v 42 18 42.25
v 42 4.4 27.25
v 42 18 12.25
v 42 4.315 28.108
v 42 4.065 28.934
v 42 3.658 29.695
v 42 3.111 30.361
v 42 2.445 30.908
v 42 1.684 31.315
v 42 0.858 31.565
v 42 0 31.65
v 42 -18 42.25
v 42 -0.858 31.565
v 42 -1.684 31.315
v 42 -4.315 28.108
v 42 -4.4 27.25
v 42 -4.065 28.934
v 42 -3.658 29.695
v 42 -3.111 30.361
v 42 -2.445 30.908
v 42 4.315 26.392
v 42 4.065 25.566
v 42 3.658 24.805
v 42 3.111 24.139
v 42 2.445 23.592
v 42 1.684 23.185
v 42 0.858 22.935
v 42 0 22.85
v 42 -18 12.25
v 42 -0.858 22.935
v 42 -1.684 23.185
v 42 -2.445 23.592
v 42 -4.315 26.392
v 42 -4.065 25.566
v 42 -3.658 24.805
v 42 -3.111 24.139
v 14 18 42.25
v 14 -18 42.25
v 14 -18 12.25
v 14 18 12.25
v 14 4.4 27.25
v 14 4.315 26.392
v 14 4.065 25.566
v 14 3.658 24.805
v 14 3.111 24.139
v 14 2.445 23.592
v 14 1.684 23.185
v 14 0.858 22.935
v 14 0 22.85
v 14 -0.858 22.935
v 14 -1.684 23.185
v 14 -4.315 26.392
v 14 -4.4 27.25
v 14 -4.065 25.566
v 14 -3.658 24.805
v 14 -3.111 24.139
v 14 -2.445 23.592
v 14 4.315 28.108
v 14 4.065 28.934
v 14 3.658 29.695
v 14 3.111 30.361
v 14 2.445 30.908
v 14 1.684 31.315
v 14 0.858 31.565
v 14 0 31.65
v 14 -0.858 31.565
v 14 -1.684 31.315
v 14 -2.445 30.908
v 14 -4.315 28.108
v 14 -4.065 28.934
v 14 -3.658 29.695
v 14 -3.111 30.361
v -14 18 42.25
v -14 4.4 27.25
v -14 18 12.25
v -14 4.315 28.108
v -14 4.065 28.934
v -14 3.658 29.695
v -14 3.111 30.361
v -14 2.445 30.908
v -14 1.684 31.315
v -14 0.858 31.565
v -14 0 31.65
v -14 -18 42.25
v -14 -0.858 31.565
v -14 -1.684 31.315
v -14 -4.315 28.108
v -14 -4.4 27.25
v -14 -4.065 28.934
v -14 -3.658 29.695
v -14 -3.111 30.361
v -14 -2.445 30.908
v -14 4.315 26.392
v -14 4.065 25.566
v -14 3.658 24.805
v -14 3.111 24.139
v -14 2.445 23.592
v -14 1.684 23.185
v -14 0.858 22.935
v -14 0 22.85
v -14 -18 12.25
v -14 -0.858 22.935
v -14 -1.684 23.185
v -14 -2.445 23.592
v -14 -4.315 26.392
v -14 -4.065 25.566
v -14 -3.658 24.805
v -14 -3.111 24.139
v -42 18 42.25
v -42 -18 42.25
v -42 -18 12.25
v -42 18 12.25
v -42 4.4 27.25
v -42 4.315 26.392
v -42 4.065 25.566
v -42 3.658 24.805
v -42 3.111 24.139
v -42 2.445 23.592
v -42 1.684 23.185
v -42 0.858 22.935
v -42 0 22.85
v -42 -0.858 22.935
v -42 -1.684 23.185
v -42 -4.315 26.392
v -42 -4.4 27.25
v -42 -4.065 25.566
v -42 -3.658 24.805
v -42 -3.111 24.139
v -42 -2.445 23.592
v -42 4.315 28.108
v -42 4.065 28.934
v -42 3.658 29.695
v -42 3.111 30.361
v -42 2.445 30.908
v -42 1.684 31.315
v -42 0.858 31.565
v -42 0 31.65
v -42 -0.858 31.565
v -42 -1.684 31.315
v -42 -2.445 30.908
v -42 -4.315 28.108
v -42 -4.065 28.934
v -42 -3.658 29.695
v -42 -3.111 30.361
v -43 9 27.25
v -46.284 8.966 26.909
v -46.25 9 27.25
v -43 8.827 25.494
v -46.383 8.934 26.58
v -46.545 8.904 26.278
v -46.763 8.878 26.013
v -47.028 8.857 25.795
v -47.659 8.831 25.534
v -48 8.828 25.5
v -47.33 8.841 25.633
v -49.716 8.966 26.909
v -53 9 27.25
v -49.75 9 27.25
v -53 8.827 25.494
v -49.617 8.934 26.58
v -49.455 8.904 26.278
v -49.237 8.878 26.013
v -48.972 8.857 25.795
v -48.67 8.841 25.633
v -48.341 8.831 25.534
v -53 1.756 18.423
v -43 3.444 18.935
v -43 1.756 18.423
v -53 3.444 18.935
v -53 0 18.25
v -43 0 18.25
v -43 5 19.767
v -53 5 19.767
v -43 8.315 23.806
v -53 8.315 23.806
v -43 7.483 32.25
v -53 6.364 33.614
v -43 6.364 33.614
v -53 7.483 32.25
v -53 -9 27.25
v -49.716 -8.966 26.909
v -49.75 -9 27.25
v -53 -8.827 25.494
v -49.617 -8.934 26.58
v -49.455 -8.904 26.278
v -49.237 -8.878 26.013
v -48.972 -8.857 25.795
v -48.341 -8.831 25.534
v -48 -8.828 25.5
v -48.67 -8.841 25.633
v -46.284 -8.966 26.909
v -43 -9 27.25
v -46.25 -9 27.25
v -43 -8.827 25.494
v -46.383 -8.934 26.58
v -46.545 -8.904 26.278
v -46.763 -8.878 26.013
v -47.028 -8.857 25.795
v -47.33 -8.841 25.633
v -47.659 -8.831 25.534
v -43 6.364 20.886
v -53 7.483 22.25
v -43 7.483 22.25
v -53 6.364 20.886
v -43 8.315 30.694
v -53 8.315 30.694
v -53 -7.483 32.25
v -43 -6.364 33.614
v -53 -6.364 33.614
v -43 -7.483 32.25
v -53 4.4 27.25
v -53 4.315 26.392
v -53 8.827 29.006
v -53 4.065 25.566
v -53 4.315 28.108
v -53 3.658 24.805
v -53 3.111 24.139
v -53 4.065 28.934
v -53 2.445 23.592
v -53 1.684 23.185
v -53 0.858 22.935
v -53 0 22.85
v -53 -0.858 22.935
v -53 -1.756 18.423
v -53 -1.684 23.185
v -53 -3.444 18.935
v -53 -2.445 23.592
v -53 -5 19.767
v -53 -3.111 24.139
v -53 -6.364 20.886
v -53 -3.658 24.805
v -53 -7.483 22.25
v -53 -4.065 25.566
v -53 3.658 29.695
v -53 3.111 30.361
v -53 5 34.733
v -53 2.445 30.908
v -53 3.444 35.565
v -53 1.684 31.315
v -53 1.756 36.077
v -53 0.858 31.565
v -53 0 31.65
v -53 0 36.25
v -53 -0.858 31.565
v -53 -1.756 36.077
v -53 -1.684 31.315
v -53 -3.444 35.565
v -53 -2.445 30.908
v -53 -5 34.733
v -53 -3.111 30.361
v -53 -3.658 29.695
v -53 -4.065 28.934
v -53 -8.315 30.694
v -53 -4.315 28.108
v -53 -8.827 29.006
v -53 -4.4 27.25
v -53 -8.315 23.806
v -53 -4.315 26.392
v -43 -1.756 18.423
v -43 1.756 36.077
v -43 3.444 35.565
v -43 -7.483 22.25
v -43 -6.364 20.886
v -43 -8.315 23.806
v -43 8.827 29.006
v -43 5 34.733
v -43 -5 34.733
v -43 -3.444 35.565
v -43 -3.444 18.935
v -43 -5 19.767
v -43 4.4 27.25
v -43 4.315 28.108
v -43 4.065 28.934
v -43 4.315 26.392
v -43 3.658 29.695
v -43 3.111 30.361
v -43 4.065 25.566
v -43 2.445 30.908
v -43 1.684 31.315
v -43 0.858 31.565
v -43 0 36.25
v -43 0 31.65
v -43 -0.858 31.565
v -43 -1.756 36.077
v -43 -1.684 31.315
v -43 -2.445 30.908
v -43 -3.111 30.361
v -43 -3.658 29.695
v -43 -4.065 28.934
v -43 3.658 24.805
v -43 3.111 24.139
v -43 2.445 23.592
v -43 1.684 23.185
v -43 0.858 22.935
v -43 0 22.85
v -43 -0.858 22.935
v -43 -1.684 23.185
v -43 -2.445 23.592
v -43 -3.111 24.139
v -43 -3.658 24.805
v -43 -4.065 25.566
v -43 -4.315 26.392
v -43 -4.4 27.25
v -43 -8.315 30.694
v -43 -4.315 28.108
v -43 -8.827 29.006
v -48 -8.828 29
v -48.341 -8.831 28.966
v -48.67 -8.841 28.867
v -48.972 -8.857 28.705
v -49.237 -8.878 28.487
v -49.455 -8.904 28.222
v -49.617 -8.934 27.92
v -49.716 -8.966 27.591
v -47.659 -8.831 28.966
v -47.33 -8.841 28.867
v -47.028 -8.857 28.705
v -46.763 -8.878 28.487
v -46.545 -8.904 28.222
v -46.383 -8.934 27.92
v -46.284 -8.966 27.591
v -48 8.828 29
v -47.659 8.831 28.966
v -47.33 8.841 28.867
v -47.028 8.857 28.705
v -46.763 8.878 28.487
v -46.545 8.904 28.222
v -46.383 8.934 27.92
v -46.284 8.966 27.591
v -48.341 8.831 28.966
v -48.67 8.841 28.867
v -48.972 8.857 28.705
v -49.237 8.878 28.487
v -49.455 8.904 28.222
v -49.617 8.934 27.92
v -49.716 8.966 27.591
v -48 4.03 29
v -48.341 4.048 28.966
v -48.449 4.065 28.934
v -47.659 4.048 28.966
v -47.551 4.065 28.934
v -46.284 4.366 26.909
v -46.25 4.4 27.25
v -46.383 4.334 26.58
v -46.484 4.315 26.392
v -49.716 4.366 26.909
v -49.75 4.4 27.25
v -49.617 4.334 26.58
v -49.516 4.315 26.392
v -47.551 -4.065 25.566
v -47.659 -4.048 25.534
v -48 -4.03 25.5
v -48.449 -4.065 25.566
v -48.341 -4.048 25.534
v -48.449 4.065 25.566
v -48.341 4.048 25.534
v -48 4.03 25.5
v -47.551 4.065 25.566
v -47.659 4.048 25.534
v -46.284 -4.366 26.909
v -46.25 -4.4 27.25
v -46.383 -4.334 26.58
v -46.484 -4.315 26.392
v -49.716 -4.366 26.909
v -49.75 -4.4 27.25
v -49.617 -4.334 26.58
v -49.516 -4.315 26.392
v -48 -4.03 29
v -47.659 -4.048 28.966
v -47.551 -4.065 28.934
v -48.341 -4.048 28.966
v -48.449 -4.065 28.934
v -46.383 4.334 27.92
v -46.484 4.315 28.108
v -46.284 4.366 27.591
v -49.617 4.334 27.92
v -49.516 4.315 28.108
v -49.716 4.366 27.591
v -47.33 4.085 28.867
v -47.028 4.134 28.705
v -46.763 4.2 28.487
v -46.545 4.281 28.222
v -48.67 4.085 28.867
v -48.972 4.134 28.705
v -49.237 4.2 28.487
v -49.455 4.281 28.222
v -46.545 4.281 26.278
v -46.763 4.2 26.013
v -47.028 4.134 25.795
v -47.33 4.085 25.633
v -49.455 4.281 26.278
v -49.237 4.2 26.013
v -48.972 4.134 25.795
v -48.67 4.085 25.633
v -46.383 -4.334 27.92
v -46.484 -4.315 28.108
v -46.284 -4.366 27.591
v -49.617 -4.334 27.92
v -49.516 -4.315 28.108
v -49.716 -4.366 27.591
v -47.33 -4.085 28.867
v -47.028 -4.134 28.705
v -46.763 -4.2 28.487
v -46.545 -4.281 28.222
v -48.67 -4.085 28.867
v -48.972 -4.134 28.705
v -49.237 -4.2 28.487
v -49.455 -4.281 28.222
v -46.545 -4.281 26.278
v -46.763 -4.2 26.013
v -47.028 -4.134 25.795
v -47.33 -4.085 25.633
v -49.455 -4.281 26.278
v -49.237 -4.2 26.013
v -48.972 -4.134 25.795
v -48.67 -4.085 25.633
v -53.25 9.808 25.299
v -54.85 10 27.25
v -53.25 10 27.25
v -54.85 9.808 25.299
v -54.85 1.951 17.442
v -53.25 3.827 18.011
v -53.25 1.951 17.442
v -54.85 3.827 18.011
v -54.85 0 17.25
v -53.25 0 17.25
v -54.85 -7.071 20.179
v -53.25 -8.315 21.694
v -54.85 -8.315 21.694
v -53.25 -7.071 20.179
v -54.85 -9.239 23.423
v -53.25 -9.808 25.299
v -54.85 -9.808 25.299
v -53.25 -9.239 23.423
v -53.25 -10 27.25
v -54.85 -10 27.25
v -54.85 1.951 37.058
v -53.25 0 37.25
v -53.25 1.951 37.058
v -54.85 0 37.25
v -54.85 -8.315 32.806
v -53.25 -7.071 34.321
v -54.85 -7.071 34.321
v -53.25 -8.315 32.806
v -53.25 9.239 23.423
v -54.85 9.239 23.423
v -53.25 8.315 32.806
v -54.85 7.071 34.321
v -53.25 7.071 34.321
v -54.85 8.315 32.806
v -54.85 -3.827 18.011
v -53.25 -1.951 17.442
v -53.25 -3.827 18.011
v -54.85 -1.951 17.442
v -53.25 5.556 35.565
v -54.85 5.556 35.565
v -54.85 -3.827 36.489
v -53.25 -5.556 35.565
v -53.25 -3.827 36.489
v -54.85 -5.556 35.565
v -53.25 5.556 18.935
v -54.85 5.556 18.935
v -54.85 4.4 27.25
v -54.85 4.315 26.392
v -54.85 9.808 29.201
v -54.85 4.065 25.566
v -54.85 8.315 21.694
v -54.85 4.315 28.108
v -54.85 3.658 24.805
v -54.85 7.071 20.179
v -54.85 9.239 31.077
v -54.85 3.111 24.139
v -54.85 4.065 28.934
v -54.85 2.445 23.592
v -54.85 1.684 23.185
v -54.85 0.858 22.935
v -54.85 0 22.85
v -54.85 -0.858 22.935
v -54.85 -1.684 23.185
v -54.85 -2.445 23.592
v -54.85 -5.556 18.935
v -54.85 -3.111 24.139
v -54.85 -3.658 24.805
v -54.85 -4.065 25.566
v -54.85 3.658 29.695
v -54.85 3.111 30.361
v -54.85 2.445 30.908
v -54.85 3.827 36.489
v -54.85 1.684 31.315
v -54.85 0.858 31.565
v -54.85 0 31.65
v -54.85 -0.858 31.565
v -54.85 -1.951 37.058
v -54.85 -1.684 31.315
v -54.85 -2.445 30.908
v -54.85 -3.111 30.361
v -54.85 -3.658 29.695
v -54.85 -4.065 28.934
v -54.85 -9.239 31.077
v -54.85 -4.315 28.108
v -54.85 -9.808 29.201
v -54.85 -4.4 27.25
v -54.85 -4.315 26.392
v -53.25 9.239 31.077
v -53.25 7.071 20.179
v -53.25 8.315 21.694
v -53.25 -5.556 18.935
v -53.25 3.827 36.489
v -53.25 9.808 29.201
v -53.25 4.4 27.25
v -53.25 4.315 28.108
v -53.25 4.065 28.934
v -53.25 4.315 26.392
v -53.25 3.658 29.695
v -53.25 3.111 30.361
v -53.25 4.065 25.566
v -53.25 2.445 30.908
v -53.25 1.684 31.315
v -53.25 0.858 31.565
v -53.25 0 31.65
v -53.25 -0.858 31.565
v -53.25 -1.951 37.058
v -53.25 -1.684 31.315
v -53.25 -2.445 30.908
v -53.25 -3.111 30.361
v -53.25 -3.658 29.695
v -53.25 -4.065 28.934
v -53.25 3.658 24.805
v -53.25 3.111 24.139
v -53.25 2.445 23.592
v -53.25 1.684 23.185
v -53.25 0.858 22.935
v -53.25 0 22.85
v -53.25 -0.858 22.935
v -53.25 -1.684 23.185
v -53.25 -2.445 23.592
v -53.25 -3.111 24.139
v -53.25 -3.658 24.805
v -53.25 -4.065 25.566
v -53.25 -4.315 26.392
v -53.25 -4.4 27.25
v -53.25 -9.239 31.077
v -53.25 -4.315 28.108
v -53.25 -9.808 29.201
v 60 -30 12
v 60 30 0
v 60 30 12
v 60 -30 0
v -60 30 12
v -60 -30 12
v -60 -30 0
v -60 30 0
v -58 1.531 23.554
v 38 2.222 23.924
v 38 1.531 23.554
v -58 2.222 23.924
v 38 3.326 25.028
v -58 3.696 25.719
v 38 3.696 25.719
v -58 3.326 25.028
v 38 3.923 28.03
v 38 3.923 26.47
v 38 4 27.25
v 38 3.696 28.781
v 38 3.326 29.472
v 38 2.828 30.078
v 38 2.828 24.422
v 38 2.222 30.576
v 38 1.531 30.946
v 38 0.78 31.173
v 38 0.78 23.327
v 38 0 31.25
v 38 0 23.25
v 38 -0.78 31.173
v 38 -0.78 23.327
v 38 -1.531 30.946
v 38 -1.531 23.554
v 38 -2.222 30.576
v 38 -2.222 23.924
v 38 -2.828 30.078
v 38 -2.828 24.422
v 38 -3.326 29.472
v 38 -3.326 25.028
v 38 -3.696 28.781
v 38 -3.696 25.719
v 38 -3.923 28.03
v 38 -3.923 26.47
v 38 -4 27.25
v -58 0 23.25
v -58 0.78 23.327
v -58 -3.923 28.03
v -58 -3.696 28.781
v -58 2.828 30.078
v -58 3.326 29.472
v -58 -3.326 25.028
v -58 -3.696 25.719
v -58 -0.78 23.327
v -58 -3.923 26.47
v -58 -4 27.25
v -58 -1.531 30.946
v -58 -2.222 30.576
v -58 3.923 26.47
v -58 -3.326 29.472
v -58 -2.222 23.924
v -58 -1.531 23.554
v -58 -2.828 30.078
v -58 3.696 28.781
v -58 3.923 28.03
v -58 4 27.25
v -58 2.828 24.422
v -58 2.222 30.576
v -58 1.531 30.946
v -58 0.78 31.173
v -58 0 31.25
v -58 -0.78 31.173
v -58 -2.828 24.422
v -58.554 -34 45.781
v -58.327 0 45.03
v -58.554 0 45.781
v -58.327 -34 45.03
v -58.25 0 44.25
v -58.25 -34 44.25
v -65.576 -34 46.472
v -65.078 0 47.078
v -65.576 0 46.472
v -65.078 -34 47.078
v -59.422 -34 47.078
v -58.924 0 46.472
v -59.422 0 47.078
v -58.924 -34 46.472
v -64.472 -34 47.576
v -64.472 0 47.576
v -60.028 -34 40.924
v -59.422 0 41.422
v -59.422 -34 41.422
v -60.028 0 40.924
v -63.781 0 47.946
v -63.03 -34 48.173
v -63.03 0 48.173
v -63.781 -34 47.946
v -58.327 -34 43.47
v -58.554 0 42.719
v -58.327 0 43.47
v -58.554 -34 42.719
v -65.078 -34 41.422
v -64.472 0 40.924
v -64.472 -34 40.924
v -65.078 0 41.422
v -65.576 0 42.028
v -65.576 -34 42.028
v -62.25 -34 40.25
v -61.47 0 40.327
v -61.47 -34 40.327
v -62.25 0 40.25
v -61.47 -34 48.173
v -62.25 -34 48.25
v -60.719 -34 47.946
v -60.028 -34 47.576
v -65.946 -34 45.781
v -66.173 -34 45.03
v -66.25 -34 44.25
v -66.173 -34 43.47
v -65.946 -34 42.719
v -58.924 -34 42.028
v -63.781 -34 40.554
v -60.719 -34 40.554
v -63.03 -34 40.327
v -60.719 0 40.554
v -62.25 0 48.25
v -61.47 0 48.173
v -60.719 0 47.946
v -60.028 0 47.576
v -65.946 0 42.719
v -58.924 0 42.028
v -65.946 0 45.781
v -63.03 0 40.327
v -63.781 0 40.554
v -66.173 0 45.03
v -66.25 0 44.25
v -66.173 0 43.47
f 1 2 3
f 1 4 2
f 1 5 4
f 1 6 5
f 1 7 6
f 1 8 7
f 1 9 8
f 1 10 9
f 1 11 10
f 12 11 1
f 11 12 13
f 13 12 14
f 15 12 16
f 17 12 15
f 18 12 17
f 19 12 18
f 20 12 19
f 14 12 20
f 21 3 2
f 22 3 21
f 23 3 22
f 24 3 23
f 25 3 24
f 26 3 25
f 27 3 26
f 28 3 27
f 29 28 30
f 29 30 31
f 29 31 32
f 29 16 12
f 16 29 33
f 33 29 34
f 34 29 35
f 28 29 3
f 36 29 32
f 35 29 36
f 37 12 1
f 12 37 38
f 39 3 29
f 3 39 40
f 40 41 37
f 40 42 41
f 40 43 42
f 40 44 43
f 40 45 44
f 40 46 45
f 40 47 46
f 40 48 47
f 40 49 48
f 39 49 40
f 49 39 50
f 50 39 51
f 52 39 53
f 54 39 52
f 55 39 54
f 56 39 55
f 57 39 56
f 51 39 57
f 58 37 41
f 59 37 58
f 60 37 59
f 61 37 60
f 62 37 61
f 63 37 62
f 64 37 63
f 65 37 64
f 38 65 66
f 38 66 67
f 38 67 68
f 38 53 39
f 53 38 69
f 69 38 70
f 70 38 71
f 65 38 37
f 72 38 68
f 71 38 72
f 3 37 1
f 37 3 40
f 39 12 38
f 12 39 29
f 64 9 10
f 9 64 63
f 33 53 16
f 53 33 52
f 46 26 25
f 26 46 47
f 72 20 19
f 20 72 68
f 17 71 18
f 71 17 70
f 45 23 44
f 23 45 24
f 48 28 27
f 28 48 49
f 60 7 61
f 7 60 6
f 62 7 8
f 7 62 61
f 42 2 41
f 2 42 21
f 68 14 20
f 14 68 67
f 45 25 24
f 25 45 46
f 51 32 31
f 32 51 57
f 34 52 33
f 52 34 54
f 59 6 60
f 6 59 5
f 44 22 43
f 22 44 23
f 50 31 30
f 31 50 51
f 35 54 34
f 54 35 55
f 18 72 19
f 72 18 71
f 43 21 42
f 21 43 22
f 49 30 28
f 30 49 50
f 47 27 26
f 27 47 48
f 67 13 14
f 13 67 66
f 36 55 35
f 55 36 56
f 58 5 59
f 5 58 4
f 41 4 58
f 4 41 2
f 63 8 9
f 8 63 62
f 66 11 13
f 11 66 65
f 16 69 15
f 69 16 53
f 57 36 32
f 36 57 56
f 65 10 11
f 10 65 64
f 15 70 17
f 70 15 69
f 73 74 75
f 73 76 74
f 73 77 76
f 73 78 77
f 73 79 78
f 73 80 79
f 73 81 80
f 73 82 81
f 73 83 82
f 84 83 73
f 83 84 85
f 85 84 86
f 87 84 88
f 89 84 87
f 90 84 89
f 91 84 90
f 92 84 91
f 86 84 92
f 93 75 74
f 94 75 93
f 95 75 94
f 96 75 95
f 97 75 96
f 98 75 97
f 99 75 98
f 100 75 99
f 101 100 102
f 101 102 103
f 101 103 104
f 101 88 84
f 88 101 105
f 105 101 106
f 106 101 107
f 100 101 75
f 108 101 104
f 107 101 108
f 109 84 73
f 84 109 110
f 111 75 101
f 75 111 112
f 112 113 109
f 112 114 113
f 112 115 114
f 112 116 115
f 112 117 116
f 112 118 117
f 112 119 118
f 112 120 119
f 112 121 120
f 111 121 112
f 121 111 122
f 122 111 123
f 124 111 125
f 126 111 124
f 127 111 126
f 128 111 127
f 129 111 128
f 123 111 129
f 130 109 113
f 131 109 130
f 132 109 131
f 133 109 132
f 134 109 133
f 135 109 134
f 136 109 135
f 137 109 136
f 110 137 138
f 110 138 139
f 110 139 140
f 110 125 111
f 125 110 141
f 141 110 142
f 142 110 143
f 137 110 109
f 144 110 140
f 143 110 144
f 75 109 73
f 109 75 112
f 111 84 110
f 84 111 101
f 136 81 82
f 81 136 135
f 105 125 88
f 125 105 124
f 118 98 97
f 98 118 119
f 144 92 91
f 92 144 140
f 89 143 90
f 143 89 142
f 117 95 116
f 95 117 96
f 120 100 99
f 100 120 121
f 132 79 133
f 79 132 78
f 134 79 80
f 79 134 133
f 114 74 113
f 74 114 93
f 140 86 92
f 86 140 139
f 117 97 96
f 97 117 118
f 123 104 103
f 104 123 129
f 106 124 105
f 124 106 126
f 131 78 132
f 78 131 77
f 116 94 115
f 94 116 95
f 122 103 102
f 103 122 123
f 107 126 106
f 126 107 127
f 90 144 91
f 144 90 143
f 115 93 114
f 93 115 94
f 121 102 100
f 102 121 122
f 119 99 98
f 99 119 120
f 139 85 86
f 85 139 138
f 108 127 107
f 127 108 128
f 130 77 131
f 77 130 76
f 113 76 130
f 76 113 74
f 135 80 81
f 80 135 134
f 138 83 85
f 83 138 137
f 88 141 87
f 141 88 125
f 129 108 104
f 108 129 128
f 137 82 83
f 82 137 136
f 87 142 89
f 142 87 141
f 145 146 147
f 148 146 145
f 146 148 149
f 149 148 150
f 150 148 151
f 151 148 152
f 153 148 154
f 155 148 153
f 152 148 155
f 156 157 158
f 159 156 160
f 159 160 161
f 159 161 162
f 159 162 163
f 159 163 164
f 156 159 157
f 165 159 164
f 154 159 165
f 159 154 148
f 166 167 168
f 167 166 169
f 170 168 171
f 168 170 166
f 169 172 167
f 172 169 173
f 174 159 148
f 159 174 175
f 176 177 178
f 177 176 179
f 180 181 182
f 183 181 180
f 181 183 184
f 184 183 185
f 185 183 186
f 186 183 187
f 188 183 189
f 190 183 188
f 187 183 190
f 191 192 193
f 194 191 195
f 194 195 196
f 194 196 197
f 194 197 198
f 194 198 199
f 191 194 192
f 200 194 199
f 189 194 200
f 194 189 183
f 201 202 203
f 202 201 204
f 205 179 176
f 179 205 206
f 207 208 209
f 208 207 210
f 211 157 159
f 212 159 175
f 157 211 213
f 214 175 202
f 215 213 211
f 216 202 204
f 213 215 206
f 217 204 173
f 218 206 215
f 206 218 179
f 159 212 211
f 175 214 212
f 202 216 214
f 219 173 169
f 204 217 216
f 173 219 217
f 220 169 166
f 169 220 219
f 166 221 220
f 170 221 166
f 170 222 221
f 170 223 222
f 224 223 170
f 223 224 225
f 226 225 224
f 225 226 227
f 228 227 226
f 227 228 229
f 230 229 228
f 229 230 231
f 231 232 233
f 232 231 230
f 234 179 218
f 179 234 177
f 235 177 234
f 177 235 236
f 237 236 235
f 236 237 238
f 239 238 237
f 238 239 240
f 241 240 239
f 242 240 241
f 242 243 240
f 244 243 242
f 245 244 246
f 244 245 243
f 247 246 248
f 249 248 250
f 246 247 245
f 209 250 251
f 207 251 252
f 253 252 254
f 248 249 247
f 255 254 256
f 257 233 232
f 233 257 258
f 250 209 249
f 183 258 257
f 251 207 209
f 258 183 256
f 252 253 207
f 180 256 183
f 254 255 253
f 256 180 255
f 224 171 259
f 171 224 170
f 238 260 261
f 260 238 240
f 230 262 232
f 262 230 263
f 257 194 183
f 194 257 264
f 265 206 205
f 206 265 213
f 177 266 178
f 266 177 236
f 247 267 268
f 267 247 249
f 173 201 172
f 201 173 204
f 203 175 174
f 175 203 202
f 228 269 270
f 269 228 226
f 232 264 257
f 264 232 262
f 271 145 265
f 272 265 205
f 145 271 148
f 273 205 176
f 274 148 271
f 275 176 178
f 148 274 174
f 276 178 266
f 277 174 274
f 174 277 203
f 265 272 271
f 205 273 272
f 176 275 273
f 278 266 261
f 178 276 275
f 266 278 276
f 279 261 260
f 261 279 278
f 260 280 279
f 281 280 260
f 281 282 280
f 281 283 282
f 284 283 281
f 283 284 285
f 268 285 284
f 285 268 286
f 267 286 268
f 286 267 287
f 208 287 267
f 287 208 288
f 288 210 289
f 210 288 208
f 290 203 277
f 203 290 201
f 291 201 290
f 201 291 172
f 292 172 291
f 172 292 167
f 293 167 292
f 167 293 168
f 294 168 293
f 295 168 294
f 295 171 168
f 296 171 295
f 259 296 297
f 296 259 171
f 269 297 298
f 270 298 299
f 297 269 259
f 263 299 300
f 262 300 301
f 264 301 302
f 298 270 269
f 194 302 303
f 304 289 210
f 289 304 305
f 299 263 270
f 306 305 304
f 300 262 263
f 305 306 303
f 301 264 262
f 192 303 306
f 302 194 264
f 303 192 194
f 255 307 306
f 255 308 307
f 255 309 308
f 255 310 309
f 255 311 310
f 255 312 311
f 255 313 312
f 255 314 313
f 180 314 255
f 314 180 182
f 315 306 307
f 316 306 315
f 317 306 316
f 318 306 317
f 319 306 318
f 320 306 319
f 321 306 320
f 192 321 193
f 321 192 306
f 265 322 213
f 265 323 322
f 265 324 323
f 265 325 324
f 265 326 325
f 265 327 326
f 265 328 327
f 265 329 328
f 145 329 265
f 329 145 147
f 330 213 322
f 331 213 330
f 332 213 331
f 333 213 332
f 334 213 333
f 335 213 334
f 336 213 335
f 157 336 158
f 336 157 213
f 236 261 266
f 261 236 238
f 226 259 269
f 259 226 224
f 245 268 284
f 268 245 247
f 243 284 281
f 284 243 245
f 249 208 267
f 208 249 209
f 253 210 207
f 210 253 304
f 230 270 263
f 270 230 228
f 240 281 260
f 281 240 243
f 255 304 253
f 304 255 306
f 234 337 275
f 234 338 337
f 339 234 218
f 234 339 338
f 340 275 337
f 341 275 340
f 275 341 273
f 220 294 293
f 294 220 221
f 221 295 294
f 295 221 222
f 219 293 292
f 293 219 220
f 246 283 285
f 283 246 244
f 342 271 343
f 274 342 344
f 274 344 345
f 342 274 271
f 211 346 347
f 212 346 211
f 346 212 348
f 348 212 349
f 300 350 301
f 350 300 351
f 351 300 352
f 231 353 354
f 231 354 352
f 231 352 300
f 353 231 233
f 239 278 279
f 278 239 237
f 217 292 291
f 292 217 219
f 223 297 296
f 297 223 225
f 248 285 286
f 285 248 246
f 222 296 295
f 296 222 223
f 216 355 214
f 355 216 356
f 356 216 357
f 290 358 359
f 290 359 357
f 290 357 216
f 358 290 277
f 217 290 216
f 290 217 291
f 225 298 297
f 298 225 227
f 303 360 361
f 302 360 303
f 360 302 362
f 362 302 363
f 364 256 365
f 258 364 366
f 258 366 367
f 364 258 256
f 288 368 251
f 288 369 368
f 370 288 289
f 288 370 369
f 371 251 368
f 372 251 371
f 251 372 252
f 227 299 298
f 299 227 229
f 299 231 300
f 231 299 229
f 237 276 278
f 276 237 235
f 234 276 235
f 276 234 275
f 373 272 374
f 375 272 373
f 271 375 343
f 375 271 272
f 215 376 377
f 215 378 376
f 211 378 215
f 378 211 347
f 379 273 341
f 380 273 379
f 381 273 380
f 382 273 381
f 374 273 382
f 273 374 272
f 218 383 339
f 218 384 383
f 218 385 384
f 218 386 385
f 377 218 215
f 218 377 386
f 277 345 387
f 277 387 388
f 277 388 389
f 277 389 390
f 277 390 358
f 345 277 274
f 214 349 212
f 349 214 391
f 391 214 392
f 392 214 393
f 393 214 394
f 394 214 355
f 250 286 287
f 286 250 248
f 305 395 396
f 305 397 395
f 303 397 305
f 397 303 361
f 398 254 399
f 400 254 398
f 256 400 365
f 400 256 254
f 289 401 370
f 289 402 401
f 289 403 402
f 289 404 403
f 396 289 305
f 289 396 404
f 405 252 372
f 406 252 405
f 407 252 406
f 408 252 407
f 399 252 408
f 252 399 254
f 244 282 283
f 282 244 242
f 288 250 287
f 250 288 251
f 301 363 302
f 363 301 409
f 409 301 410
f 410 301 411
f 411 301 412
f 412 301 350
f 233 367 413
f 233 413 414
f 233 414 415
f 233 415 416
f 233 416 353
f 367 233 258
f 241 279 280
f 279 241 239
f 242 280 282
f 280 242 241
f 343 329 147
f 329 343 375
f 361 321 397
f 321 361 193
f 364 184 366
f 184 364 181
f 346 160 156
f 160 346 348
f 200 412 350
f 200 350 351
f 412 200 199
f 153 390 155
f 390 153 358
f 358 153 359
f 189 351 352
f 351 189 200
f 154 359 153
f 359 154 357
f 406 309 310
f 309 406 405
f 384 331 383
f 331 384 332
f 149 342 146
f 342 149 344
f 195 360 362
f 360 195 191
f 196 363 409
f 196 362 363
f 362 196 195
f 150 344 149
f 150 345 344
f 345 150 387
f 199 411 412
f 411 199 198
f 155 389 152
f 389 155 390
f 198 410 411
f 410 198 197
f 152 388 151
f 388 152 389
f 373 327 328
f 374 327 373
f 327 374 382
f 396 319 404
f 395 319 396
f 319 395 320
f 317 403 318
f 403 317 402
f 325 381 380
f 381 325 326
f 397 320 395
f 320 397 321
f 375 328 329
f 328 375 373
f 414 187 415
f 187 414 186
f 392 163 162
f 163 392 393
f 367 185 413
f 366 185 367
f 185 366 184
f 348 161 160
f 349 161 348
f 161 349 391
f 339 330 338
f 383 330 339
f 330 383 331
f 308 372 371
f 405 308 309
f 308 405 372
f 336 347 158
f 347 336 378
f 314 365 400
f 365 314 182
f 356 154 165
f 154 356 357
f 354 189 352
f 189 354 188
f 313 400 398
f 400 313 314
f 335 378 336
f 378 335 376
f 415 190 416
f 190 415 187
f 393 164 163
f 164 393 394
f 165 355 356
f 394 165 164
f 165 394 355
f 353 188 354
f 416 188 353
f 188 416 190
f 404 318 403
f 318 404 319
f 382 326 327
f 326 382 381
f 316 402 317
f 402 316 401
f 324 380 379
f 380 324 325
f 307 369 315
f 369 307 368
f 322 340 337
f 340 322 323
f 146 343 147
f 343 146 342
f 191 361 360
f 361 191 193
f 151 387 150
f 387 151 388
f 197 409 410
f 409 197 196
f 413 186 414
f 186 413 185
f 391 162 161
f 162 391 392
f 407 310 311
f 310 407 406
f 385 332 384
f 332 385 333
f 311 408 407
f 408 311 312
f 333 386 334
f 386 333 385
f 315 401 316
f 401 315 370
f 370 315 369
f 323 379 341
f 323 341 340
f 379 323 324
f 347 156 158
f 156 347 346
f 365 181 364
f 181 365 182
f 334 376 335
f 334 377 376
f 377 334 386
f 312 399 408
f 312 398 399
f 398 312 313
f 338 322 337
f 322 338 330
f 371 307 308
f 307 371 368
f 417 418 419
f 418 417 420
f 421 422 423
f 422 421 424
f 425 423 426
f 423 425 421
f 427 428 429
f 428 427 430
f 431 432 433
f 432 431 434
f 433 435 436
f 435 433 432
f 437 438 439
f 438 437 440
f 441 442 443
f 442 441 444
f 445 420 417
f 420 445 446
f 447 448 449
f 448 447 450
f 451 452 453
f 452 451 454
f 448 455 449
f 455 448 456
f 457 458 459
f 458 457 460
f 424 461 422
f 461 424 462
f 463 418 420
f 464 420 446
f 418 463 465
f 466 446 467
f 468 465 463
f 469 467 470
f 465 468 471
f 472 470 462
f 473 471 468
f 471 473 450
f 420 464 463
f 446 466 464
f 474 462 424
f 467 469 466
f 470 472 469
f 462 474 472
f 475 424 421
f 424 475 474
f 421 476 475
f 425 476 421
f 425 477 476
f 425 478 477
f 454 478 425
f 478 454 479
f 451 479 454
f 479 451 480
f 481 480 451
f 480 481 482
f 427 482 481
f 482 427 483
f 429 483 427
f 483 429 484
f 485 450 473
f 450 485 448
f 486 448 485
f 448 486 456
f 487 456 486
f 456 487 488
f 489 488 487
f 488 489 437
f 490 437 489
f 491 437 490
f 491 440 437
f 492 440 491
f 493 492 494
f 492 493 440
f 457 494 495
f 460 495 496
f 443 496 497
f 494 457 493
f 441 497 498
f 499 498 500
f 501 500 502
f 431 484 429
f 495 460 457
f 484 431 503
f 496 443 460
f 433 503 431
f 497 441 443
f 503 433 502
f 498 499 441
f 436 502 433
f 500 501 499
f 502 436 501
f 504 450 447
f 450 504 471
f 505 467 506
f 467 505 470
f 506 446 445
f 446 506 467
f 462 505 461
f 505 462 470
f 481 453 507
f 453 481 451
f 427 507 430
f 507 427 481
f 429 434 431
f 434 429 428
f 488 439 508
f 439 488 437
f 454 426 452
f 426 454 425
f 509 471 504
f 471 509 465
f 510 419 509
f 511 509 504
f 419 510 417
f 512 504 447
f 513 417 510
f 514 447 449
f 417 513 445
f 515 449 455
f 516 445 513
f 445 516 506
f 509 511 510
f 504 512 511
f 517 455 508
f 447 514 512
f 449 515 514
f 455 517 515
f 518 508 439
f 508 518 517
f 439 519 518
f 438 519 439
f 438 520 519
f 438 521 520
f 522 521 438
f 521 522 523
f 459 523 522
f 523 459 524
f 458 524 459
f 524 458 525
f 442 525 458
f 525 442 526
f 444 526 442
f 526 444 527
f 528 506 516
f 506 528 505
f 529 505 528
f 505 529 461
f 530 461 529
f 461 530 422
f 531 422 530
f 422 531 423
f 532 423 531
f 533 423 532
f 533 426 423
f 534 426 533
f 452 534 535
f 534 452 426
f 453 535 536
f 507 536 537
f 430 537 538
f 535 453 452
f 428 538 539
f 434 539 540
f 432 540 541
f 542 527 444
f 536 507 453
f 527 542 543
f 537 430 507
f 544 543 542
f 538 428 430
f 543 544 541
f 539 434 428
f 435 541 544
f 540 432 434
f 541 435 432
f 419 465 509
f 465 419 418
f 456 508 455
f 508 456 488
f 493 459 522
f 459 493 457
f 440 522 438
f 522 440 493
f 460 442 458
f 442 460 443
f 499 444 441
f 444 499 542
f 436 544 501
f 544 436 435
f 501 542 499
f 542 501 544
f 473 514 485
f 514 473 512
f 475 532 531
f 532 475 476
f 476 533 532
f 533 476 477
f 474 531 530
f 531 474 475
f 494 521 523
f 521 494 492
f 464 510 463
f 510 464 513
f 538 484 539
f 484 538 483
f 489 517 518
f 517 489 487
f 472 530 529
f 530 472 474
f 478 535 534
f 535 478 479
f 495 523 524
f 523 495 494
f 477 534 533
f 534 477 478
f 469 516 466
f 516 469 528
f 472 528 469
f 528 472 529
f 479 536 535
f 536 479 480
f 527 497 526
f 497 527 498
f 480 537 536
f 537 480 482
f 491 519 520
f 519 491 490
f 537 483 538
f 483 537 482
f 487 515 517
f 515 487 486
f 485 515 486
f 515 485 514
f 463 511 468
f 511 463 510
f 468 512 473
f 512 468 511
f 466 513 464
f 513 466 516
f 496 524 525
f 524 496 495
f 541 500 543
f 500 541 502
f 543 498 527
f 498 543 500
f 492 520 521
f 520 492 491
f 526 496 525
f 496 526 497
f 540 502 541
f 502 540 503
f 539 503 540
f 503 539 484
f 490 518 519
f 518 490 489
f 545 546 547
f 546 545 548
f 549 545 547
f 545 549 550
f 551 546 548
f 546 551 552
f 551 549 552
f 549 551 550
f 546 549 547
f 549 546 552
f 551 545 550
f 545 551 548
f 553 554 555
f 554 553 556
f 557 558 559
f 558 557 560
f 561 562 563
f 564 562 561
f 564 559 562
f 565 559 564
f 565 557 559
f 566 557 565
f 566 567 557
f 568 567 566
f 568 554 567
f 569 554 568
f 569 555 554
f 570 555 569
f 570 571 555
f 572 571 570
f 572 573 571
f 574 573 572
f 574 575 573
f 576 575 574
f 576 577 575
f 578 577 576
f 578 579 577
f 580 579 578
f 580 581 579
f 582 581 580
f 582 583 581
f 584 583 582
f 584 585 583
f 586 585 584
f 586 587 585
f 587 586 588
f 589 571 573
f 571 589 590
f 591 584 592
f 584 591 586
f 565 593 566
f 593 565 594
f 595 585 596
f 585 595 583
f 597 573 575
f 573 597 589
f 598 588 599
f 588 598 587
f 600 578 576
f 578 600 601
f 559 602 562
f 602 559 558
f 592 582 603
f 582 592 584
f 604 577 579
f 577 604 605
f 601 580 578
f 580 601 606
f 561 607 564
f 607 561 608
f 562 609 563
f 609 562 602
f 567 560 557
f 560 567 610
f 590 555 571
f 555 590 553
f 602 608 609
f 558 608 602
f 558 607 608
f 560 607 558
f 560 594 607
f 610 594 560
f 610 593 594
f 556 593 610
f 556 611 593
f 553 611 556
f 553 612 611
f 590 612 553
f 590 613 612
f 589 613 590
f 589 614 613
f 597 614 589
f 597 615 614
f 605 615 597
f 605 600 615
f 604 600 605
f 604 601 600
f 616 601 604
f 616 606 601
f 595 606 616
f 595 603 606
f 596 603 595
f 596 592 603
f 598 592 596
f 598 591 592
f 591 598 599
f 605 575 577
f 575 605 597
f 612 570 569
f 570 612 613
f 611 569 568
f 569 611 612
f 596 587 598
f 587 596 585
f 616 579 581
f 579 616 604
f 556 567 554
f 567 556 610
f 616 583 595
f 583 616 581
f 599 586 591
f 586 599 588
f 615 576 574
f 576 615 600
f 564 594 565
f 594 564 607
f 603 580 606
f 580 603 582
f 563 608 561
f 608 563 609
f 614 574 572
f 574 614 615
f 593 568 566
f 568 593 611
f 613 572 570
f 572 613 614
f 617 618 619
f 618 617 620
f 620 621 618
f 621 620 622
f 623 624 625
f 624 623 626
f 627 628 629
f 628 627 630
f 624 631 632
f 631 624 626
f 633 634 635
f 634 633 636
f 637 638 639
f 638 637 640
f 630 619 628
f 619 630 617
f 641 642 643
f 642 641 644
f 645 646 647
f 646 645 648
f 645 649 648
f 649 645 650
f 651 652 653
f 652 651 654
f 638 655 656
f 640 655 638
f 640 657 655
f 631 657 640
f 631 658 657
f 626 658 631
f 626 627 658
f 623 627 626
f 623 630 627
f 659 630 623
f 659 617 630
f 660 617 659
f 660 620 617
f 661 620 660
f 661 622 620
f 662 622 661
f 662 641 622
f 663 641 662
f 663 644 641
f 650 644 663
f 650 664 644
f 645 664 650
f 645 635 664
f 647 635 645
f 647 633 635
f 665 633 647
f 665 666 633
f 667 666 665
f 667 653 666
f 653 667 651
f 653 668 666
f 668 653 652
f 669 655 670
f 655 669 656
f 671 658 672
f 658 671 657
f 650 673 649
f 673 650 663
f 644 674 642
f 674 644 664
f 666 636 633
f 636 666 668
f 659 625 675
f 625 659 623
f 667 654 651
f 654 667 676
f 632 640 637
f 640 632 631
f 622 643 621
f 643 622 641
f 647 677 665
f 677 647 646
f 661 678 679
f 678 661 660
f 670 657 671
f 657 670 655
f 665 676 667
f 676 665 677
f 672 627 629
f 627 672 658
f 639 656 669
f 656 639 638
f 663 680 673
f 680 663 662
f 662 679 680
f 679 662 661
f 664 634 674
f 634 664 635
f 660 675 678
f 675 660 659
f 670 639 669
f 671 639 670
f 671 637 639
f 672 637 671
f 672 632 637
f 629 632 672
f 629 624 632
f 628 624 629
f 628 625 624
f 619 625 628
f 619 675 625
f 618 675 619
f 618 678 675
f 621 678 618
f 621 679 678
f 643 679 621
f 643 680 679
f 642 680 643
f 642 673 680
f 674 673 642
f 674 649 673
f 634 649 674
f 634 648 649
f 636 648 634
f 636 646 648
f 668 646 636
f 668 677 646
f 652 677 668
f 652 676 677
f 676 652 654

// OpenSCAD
$fn = 32;

// ------------------------------------------------------------------------
// Machine vise: screw d8, jaws 28 x 30 mm
// Every part is its own module, assembly() places every instance.
// ------------------------------------------------------------------------

// --- part 1 ---
module vise_bed() {
  difference() {
    translate([-60, -30, 0]) cube([120, 60, 12]);
  }
}

// --- part 2 ---
module vise_jaw() {
  difference() {
    translate([-14, -18, 0]) cube([28, 36, 30]);
    translate([0, 0, 15]) rotate([0, 90, 0]) cylinder(h = 30, d = 8.8, center = true);
  }
}

// --- part 3 ---
module vise_screw() {
  translate([0, 0, -48]) cylinder(h = 96, d = 8);
}

// --- part 4 ---
module screw_collar() {
  difference() {
    cylinder(h = 10, d = 18);
    translate([0, 0, -1]) cylinder(h = 12, d = 8.8);
    translate([0, 0, 5]) rotate([90, 0, 0]) cylinder(h = 20, d = 3.5, center = true);
  }
}

// --- part 5 ---
module screw_washer() {
  difference() {
      translate([0, 0, 0]) cylinder(h = 1.6, d = 20);
      translate([0, 0, -1]) cylinder(h = 3.6, d = 8.8);
    }
}

// --- part 6 ---
module vise_handle() {
  cylinder(h = 34, d = 8);
}

// --- assembly ---
module assembly() {
  color([0.80, 0.24, 0.20]) translate([0, 0, 0]) rotate([0, 0, 0]) vise_bed();
  color([0.20, 0.45, 0.75]) translate([28, 0, 12.25]) rotate([0, 0, 0]) vise_jaw();
  color([0.25, 0.62, 0.32]) translate([-28, 0, 12.25]) rotate([0, 0, 0]) vise_jaw();
  color([0.92, 0.70, 0.18]) translate([-10, 0, 27.25]) rotate([0, 90, 0]) vise_screw();
  color([0.58, 0.35, 0.70]) translate([-53, 0, 27.25]) rotate([0, 90, 0]) screw_collar();
  color([0.16, 0.66, 0.66]) translate([-54.85, 0, 27.25]) rotate([0, 90, 0]) screw_washer();
  color([0.85, 0.48, 0.18]) translate([-62.25, 0, 44.25]) rotate([90, 0, 0]) vise_handle();
}

assembly();
